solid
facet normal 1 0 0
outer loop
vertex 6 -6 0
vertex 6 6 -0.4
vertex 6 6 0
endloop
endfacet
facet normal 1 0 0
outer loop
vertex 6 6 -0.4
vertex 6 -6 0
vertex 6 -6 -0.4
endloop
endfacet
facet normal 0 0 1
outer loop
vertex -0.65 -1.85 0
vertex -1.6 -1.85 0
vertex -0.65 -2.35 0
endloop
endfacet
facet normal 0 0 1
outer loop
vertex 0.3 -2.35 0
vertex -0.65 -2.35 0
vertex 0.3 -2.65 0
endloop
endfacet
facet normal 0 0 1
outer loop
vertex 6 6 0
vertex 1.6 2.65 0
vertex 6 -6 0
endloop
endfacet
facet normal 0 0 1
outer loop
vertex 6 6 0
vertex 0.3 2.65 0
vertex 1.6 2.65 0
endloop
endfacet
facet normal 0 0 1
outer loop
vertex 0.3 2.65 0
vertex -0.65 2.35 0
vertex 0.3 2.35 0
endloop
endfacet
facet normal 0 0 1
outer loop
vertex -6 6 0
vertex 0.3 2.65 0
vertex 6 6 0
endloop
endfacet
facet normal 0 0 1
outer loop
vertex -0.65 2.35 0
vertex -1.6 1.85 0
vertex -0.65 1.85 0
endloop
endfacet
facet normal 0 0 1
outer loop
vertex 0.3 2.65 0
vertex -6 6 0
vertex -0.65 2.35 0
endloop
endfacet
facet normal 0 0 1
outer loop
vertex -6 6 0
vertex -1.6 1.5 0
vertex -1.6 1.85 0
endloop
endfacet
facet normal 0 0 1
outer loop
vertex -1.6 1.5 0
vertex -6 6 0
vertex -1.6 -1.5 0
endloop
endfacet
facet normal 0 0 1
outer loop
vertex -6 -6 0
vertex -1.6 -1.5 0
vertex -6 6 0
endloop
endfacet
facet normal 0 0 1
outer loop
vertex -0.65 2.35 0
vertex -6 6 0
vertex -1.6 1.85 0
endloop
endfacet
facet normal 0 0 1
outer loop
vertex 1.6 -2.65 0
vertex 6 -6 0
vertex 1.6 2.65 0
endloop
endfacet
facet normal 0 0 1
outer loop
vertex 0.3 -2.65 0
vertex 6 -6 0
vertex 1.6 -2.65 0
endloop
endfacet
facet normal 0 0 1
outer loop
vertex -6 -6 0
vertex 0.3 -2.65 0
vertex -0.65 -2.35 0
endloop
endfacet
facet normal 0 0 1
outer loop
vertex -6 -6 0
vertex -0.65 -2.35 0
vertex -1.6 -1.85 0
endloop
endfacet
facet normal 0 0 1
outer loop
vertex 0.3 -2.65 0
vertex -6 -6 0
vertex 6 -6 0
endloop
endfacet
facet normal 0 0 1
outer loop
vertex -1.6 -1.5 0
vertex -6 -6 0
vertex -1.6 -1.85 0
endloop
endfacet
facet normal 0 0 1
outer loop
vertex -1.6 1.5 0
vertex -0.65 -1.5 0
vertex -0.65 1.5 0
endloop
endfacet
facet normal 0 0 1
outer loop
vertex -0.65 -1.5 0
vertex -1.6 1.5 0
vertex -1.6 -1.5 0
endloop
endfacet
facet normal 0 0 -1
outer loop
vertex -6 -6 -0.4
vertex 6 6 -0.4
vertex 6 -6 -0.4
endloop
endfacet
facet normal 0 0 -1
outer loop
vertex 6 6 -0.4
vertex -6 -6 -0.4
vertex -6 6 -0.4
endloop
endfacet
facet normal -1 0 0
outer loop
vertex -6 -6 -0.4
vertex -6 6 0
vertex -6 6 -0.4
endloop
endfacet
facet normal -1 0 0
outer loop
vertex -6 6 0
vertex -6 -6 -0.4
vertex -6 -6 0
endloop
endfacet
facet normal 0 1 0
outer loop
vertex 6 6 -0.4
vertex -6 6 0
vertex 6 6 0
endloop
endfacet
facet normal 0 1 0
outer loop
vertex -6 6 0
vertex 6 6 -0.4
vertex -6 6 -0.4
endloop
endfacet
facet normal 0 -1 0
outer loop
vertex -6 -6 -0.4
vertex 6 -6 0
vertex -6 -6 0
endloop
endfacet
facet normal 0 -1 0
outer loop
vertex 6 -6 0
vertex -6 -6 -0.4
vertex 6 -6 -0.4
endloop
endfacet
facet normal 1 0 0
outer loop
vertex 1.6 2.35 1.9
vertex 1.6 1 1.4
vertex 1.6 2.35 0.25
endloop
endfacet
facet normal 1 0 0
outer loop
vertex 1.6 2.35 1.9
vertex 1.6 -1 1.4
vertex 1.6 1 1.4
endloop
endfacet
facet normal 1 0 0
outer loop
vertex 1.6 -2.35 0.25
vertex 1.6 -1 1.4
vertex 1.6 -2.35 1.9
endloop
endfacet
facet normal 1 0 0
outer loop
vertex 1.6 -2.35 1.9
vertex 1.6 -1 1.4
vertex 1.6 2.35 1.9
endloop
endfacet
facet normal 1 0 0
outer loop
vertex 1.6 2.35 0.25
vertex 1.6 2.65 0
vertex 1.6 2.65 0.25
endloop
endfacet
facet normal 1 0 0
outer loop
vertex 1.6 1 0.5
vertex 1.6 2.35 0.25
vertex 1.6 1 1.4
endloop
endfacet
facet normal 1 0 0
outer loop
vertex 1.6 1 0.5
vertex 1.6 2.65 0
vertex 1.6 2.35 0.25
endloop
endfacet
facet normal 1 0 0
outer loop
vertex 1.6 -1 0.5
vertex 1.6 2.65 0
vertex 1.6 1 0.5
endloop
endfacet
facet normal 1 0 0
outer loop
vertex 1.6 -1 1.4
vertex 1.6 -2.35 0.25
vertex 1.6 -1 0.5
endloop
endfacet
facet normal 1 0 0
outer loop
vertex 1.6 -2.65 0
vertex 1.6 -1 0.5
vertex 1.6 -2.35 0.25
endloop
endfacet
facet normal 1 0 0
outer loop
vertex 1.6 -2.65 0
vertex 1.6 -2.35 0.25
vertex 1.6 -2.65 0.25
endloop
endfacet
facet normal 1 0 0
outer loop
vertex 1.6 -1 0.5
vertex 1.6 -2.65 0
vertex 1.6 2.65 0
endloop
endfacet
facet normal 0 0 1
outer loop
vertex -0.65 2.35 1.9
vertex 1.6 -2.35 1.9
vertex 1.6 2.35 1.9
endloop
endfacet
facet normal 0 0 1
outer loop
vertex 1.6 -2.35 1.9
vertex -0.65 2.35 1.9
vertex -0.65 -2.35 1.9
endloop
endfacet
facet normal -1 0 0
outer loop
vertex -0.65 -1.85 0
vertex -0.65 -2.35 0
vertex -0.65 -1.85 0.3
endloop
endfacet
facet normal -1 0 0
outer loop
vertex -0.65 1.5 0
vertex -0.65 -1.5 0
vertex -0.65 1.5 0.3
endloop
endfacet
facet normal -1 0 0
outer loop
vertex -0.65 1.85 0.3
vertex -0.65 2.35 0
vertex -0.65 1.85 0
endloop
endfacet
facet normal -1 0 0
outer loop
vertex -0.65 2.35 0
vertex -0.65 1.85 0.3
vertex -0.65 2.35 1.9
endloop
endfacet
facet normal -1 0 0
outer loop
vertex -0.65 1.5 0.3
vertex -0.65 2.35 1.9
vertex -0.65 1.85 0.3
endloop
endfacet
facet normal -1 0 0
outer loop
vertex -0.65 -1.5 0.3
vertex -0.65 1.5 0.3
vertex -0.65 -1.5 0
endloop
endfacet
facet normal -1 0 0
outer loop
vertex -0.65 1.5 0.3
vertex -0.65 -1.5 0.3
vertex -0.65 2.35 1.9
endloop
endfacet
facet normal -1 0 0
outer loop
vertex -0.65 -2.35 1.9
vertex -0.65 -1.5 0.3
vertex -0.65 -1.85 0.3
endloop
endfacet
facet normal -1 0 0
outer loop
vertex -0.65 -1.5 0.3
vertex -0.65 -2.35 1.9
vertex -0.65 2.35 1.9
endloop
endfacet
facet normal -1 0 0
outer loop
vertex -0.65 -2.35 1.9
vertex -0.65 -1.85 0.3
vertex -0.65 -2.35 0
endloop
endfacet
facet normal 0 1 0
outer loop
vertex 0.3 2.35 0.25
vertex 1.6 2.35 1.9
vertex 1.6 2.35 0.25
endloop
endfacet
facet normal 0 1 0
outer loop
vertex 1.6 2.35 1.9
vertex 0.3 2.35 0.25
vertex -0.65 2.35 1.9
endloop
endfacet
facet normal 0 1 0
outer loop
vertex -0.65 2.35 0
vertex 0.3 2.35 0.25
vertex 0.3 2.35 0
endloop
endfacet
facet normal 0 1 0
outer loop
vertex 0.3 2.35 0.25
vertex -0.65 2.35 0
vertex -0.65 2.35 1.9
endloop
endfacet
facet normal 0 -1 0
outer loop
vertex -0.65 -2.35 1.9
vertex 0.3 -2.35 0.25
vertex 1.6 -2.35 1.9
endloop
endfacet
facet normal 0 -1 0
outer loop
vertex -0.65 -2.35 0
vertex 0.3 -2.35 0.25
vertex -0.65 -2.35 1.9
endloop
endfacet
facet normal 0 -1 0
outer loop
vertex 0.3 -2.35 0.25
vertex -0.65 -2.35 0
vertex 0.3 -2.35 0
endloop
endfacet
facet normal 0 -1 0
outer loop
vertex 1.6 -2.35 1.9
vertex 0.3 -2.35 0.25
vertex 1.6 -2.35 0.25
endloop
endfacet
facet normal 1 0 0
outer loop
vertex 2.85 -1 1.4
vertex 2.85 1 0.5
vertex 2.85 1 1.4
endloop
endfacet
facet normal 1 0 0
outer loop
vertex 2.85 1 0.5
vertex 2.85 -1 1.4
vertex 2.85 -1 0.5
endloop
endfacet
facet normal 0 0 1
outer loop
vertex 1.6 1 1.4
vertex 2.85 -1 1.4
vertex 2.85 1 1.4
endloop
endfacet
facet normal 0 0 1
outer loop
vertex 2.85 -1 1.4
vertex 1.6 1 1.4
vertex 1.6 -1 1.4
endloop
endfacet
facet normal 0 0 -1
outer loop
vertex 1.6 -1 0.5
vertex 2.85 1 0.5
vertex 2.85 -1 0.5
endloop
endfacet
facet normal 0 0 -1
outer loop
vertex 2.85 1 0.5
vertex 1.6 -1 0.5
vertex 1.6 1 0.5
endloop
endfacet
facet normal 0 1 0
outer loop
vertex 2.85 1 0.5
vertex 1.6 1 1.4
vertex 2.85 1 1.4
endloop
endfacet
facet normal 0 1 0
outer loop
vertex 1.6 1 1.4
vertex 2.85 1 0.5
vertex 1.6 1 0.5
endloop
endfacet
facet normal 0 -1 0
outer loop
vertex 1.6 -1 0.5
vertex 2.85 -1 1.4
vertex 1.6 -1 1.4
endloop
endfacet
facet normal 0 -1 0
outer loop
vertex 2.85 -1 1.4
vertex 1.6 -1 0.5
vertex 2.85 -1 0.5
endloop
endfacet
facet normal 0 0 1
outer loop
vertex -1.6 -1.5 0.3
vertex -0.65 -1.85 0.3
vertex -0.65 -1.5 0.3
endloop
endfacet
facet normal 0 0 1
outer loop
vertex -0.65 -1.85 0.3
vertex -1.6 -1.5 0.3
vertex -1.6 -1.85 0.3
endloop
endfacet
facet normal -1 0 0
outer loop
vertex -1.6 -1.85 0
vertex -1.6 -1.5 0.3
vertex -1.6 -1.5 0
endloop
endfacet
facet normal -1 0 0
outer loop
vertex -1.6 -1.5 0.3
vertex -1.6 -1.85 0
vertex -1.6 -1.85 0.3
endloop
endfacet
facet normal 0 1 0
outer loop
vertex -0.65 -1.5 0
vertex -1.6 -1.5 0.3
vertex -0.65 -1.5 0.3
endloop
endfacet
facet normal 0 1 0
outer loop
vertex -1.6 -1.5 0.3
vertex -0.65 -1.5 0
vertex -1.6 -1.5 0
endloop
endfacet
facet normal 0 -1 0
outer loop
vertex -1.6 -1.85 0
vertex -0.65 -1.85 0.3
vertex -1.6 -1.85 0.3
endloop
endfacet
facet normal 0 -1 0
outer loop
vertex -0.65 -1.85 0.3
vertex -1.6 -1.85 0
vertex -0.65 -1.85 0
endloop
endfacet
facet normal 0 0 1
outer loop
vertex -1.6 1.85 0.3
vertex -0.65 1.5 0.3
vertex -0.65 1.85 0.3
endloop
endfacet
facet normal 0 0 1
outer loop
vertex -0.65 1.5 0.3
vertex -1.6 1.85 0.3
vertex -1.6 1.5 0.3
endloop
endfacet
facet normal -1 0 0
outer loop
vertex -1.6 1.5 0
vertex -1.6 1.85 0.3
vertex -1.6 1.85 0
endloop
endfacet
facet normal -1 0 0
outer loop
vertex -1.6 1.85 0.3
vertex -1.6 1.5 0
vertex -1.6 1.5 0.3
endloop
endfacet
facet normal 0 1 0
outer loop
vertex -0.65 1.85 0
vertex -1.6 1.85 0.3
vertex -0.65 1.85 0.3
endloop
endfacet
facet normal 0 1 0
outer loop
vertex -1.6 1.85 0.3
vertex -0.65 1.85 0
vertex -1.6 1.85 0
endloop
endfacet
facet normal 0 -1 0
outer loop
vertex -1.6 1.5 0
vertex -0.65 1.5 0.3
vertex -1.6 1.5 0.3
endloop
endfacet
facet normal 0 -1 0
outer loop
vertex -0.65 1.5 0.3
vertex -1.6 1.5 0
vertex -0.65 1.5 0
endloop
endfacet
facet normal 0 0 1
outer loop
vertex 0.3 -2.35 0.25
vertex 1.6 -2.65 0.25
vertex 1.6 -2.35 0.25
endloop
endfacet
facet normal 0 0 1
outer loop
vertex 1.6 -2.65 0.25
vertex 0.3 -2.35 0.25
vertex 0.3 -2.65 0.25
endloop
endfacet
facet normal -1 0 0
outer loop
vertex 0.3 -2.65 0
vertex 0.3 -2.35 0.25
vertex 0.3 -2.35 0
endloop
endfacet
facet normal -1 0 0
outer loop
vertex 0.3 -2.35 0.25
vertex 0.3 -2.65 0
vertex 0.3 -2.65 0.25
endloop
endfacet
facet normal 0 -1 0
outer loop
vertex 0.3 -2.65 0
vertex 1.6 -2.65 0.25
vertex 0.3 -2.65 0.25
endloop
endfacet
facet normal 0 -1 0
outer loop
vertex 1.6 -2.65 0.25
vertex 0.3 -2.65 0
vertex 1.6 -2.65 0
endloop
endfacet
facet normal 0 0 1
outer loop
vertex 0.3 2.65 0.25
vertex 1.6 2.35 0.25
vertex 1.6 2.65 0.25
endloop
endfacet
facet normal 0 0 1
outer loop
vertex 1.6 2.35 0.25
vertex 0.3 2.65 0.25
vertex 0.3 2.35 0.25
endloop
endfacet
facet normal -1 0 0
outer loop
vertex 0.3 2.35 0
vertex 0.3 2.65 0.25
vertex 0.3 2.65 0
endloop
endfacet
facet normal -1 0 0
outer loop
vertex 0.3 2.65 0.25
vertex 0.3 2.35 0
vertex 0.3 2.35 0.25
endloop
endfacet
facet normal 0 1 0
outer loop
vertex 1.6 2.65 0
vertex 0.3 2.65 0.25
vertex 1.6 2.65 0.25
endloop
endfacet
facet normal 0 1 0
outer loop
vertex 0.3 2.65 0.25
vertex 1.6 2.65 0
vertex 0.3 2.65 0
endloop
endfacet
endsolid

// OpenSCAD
// SW_TS24CA_2x4_SideAct —— 由 gen_3d_ts24ca.py 生成，不要手改
// 用途：渲染出图自检按钮朝向。PCB 面 = z0 平面，按钮应朝 +X 伸出。
$fn = 32;
color([0.6,0.75,0.6,0.35]) translate([-6,-6,-0.4]) cube([12,12,0.4]); // 示意 PCB
color([0.88,0.87,0.83]) translate([-0.650,-2.350,0.000]) cube([2.250,4.700,1.900]);  // body
color([0.18,0.18,0.20]) translate([1.600,-1.000,0.500]) cube([1.250,2.000,0.900]);  // button
color([0.75,0.75,0.78]) translate([-1.600,-1.850,0.000]) cube([0.950,0.350,0.300]);  // term1
color([0.75,0.75,0.78]) translate([-1.600,1.500,0.000]) cube([0.950,0.350,0.300]);  // term2
color([0.72,0.66,0.40]) translate([0.300,-2.650,0.000]) cube([1.300,1.050,0.250]);  // mp1
color([0.72,0.66,0.40]) translate([0.300,1.600,0.000]) cube([1.300,1.050,0.250]);  // mp2
color([0.88,0.87,0.83]) translate([0.450,-1.100,-0.400]) cube([0.500,0.500,0.400]);  // post1
color([0.88,0.87,0.83]) translate([0.450,0.600,-0.400]) cube([0.500,0.500,0.400]);  // post2
